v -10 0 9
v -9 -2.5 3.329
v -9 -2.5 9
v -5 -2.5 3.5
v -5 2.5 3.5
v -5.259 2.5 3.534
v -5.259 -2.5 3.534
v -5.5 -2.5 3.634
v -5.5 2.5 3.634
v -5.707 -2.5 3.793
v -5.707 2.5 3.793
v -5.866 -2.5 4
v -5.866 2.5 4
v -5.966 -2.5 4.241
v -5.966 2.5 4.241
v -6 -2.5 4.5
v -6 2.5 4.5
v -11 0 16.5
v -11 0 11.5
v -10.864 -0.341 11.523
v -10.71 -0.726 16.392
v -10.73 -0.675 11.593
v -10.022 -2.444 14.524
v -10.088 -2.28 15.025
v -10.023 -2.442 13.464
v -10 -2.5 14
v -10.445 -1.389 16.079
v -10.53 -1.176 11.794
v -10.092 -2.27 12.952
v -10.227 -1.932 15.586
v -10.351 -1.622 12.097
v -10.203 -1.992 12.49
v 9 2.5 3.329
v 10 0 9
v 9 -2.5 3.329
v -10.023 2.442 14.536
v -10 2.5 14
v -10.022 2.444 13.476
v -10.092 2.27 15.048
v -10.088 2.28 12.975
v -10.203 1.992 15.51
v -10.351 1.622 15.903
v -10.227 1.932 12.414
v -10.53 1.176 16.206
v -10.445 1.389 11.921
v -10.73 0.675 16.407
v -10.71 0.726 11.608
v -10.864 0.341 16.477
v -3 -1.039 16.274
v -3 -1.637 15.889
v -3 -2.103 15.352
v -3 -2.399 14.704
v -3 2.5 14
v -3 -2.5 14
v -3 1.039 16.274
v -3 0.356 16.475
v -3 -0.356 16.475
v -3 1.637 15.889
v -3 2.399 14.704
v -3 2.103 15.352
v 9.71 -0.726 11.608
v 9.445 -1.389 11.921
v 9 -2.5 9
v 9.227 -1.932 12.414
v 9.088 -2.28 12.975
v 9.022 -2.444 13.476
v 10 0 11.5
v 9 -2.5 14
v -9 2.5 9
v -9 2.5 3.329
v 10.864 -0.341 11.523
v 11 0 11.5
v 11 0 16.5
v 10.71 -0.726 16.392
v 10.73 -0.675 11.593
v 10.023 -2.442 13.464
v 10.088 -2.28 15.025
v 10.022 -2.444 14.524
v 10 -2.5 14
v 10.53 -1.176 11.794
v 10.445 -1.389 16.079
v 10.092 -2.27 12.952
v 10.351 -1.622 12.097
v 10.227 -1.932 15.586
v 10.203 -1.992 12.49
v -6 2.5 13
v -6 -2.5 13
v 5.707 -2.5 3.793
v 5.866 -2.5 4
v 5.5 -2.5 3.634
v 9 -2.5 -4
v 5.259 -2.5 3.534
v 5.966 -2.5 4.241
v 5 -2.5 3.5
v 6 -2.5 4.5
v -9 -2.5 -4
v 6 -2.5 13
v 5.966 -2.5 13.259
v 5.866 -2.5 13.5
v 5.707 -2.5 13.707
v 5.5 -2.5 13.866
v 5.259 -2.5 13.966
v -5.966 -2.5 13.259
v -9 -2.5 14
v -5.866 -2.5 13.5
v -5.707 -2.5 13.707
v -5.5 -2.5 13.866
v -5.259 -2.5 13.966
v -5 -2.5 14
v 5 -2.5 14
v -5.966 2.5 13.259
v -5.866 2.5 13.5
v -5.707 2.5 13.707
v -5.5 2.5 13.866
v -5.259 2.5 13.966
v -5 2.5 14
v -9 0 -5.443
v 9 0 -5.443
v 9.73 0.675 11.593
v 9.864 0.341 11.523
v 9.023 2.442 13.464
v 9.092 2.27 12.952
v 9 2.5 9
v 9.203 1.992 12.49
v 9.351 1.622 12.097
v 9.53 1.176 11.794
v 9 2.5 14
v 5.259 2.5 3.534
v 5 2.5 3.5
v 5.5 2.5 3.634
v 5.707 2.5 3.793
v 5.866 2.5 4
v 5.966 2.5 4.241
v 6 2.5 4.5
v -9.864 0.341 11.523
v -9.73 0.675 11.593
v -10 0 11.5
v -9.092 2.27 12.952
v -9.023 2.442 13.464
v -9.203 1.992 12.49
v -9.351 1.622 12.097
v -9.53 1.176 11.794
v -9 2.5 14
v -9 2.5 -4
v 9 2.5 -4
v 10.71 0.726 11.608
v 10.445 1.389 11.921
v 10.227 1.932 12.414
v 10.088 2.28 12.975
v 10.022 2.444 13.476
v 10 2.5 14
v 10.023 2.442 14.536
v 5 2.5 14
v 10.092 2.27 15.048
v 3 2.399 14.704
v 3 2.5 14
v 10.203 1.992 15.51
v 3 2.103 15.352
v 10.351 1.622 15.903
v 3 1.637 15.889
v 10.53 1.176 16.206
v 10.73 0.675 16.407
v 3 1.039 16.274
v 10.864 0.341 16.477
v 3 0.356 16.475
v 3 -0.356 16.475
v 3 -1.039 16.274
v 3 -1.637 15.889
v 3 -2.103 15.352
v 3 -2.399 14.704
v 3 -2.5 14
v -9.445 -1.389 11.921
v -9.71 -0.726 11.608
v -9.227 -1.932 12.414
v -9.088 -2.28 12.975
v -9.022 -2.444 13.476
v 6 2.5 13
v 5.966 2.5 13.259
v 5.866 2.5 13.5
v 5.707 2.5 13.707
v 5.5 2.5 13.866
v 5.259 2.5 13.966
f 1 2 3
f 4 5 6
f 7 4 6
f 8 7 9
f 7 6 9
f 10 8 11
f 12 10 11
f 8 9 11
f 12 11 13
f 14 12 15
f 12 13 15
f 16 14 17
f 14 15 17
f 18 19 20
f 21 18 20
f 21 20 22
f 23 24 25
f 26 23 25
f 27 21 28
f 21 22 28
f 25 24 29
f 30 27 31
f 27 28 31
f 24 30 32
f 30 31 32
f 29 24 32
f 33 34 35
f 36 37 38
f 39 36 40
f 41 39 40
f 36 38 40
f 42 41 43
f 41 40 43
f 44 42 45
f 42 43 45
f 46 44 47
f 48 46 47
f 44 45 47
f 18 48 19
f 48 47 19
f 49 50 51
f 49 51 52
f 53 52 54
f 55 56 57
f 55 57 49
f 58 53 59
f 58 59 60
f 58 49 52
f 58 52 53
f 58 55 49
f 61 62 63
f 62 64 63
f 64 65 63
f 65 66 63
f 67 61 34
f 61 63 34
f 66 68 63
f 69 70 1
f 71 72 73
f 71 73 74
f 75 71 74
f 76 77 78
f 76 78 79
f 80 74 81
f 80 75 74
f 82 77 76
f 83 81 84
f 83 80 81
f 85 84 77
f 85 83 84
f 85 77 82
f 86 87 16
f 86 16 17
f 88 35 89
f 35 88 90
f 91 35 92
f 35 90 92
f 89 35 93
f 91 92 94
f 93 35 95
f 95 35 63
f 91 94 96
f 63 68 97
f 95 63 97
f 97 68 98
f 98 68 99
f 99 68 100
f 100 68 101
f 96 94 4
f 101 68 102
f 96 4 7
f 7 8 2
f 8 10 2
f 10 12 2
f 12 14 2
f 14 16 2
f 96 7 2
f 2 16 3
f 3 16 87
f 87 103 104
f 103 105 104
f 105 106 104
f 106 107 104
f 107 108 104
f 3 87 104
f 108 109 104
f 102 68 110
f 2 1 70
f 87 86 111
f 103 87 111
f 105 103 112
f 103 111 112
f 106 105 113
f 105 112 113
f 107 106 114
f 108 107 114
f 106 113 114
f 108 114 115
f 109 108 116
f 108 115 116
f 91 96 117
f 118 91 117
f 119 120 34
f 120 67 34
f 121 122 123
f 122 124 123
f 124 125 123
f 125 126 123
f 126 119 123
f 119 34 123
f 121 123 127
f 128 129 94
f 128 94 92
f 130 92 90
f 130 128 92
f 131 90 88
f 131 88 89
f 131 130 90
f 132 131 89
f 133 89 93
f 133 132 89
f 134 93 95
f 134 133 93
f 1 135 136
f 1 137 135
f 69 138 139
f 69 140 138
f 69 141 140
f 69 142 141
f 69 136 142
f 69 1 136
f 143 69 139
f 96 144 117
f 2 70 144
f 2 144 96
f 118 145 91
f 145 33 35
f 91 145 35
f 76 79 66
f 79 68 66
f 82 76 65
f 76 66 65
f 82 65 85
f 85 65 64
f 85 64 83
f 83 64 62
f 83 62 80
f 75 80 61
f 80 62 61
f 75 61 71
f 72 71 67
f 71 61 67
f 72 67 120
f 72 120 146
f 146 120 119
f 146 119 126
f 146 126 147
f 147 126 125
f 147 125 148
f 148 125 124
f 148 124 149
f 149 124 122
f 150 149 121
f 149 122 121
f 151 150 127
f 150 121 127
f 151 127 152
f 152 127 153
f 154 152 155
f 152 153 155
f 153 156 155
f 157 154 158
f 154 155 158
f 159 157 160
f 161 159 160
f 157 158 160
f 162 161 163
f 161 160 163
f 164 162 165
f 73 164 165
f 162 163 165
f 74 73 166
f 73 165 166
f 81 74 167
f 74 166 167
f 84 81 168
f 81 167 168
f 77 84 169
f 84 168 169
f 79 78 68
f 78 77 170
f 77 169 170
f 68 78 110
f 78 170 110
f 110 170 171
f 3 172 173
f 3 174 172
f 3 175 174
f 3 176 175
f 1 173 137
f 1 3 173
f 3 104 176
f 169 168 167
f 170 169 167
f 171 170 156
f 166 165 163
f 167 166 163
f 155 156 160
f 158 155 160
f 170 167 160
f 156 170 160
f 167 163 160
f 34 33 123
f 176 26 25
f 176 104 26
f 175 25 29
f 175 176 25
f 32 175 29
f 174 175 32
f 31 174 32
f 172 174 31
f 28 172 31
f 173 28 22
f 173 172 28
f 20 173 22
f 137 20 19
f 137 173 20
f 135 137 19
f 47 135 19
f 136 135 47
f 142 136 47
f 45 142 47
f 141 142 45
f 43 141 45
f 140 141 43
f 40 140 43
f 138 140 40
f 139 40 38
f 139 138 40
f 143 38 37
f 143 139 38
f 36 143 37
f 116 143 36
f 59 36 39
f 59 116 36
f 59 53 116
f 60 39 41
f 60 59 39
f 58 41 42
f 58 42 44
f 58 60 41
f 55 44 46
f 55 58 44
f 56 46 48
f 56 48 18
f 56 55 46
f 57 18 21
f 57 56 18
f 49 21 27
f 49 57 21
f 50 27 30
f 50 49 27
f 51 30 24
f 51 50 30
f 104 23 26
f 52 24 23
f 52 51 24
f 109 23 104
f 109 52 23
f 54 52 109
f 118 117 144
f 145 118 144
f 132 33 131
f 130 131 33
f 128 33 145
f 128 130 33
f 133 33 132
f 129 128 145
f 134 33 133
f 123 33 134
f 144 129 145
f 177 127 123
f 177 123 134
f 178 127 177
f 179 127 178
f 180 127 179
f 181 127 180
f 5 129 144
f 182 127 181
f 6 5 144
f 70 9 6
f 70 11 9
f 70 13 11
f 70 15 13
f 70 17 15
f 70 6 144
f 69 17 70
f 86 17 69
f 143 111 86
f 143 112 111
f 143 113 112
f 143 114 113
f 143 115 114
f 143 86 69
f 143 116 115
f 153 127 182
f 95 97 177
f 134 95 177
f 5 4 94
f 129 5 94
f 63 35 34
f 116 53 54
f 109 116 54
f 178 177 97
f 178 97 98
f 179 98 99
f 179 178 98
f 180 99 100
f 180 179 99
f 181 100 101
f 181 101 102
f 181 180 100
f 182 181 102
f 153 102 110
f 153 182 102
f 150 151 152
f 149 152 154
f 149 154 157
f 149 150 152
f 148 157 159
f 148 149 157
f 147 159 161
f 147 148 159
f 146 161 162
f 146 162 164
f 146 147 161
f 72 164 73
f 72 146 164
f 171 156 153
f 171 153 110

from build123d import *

# Parameters (mm, degrees)
F2_DEPTH     = 2.5
F3_DEPTH     = 10
F4_DEPTH     = 3
F5_DEPTH     = 6
F6_T1_DEPTH  = 5
F8_DEPTH     = 14
F9_DEPTH     = 9
F10_DEPTH    = 1
F11_DEPTH    = 16.5
F12_T4_DEPTH = 5
F14_DEPTH    = 6
F15_T1_DEPTH = 35.9238558823


# Not quite as in the source:
# - a fillet or chamfer that OpenCascade refuses, or shapes differently, is made with other operations: its cross-section is extruded or revolved along the edge and cut away or added


with BuildPart() as f2:
    # F0 (on Front) → F2 (new body, symmetric)
    with BuildSketch(Plane.XZ):
        Polygon((0, 3.5), (0, 0), (9, 0), (9, 14), (6, 14), (6, 3.5), align=None)
    extrude(amount=F2_DEPTH, both=True)

    # F1 (on Right) → F3 (join)
    with BuildSketch(Plane.YZ):
        with BuildLine():
            Line((-2.5, 14), (2.5, 14))
            ThreePointArc((2.5, 14), (0, 16.5), (-2.5, 14))
        make_face()
        with BuildLine():
            ThreePointArc((-2.5, 14), (0, 11.5), (2.5, 14))
            Line((2.5, 14), (-2.5, 14))
        make_face()
    extrude(amount=F3_DEPTH)

    # F1 (on Right) → F4 (cut)
    with BuildSketch(Plane.YZ):
        with BuildLine():
            Line((-2.5, 14), (2.5, 14))
            ThreePointArc((2.5, 14), (0, 16.5), (-2.5, 14))
        make_face()
        with BuildLine():
            ThreePointArc((-2.5, 14), (0, 11.5), (2.5, 14))
            Line((2.5, 14), (-2.5, 14))
        make_face()
    extrude(amount=F4_DEPTH, mode=Mode.SUBTRACT)

    # F1 (on Right) → F5 (cut)
    with BuildSketch(Plane.YZ):
        with BuildLine():
            ThreePointArc((-2.5, 14), (0, 11.5), (2.5, 14))
            Line((2.5, 14), (-2.5, 14))
        make_face()
    extrude(amount=F5_DEPTH, mode=Mode.SUBTRACT)

    # F6: fillet of radius 1 on 2 edges, made by hand

    # F6_s2 → F6_t1 (join)
    with BuildSketch(Plane.XZ.offset(-2.5)):
        with BuildLine():
            ThreePointArc((6, 13), (5.7071067812, 13.7071067812), (5, 14))
            Line((5, 14), (6, 14))
            Line((6, 14), (6, 13))
        make_face()
        with BuildLine():
            ThreePointArc((5, 3.5), (5.7071067812, 3.7928932188), (6, 4.5))
            Line((6, 4.5), (6, 3.5))
            Line((6, 3.5), (5, 3.5))
        make_face()
    extrude(amount=F6_T1_DEPTH)

    # F7 (on Top) → F8 (join)
    with BuildSketch(Plane.XY):
        Polygon((9, 2.5), (9, -2.5), (10, 0), align=None)
    extrude(amount=F8_DEPTH)

    # F7 (on Top) → F9 (cut)
    with BuildSketch(Plane.XY):
        Polygon((9, 2.5), (9, -2.5), (10, 0), align=None)
    extrude(amount=F9_DEPTH, mode=Mode.SUBTRACT)

    # F10 (add): a face of the model
    f10_faces = [f2.faces().sort_by_distance(p)[0] for p in [
        (10, -1.717766953, 12.282233047),
    ]]
    extrude(f10_faces, amount=F10_DEPTH)

    # F7 (on Top) → F11 (cut)
    with BuildSketch(Plane.XY):
        Polygon((11, 0), (10, -2.5), (11.5, -2.5), (11.5, 2.5), (10, 2.5), align=None)
    extrude(amount=F11_DEPTH, mode=Mode.SUBTRACT)

    # F12: chamfer of 1 x 5.6712818196 on 1 edges, made by hand


with BuildPart() as f12_tool2:
    # F12_s3 → F12_t4 (new body)
    with BuildSketch(Plane.XZ.offset(-2.5)):
        Polygon((10, 9), (9, 3.3287181804), (9, 9), align=None)
    extrude(amount=F12_T4_DEPTH)

    split(bisect_by=Plane(origin=(8.6206896552, 3.4482758621, 0), x_dir=(0, 0, 1), z_dir=(-0.9284766909, -0.3713906764, 0)), keep=Keep.TOP)

    split(bisect_by=Plane(origin=(8.6206896552, -3.4482758621, 0), x_dir=(0, 0, 1), z_dir=(-0.9284766909, 0.3713906764, 0)), keep=Keep.TOP)


with BuildPart() as f2_1:
    add(f2.part)

    # F12_t1: union F12_tool2
    add(f12_tool2.part)

    # F13: F2 across face


with BuildPart() as f2_2:
    add(f2_1.part)
    add(f2_1.part.mirror(Plane(origin=(0, 0, 1.75), x_dir=(0, -1, 0), z_dir=(-1, 0, 0))))

    # F14 (add): a face of the model
    f14_faces = [f2_2.faces().sort_by_distance(p)[0] for p in [
        (0, 0, 0),
    ]]
    extrude(f14_faces, amount=F14_DEPTH)

    # F15: chamfer of 2 x 3.4641016151 on 2 edges, made by hand

    # F15_s2 → F15_t1 (cut)
    with BuildSketch(Plane.YZ.offset(-17.9619279412)):
        Polygon((-2.5, -4), (0.9641016151, -6), (-2.5, -6), align=None)
        Polygon((-0.9641016151, -6), (2.5, -4), (2.5, -6), align=None)
    extrude(amount=F15_T1_DEPTH, mode=Mode.SUBTRACT)


solid = f2_2.part
